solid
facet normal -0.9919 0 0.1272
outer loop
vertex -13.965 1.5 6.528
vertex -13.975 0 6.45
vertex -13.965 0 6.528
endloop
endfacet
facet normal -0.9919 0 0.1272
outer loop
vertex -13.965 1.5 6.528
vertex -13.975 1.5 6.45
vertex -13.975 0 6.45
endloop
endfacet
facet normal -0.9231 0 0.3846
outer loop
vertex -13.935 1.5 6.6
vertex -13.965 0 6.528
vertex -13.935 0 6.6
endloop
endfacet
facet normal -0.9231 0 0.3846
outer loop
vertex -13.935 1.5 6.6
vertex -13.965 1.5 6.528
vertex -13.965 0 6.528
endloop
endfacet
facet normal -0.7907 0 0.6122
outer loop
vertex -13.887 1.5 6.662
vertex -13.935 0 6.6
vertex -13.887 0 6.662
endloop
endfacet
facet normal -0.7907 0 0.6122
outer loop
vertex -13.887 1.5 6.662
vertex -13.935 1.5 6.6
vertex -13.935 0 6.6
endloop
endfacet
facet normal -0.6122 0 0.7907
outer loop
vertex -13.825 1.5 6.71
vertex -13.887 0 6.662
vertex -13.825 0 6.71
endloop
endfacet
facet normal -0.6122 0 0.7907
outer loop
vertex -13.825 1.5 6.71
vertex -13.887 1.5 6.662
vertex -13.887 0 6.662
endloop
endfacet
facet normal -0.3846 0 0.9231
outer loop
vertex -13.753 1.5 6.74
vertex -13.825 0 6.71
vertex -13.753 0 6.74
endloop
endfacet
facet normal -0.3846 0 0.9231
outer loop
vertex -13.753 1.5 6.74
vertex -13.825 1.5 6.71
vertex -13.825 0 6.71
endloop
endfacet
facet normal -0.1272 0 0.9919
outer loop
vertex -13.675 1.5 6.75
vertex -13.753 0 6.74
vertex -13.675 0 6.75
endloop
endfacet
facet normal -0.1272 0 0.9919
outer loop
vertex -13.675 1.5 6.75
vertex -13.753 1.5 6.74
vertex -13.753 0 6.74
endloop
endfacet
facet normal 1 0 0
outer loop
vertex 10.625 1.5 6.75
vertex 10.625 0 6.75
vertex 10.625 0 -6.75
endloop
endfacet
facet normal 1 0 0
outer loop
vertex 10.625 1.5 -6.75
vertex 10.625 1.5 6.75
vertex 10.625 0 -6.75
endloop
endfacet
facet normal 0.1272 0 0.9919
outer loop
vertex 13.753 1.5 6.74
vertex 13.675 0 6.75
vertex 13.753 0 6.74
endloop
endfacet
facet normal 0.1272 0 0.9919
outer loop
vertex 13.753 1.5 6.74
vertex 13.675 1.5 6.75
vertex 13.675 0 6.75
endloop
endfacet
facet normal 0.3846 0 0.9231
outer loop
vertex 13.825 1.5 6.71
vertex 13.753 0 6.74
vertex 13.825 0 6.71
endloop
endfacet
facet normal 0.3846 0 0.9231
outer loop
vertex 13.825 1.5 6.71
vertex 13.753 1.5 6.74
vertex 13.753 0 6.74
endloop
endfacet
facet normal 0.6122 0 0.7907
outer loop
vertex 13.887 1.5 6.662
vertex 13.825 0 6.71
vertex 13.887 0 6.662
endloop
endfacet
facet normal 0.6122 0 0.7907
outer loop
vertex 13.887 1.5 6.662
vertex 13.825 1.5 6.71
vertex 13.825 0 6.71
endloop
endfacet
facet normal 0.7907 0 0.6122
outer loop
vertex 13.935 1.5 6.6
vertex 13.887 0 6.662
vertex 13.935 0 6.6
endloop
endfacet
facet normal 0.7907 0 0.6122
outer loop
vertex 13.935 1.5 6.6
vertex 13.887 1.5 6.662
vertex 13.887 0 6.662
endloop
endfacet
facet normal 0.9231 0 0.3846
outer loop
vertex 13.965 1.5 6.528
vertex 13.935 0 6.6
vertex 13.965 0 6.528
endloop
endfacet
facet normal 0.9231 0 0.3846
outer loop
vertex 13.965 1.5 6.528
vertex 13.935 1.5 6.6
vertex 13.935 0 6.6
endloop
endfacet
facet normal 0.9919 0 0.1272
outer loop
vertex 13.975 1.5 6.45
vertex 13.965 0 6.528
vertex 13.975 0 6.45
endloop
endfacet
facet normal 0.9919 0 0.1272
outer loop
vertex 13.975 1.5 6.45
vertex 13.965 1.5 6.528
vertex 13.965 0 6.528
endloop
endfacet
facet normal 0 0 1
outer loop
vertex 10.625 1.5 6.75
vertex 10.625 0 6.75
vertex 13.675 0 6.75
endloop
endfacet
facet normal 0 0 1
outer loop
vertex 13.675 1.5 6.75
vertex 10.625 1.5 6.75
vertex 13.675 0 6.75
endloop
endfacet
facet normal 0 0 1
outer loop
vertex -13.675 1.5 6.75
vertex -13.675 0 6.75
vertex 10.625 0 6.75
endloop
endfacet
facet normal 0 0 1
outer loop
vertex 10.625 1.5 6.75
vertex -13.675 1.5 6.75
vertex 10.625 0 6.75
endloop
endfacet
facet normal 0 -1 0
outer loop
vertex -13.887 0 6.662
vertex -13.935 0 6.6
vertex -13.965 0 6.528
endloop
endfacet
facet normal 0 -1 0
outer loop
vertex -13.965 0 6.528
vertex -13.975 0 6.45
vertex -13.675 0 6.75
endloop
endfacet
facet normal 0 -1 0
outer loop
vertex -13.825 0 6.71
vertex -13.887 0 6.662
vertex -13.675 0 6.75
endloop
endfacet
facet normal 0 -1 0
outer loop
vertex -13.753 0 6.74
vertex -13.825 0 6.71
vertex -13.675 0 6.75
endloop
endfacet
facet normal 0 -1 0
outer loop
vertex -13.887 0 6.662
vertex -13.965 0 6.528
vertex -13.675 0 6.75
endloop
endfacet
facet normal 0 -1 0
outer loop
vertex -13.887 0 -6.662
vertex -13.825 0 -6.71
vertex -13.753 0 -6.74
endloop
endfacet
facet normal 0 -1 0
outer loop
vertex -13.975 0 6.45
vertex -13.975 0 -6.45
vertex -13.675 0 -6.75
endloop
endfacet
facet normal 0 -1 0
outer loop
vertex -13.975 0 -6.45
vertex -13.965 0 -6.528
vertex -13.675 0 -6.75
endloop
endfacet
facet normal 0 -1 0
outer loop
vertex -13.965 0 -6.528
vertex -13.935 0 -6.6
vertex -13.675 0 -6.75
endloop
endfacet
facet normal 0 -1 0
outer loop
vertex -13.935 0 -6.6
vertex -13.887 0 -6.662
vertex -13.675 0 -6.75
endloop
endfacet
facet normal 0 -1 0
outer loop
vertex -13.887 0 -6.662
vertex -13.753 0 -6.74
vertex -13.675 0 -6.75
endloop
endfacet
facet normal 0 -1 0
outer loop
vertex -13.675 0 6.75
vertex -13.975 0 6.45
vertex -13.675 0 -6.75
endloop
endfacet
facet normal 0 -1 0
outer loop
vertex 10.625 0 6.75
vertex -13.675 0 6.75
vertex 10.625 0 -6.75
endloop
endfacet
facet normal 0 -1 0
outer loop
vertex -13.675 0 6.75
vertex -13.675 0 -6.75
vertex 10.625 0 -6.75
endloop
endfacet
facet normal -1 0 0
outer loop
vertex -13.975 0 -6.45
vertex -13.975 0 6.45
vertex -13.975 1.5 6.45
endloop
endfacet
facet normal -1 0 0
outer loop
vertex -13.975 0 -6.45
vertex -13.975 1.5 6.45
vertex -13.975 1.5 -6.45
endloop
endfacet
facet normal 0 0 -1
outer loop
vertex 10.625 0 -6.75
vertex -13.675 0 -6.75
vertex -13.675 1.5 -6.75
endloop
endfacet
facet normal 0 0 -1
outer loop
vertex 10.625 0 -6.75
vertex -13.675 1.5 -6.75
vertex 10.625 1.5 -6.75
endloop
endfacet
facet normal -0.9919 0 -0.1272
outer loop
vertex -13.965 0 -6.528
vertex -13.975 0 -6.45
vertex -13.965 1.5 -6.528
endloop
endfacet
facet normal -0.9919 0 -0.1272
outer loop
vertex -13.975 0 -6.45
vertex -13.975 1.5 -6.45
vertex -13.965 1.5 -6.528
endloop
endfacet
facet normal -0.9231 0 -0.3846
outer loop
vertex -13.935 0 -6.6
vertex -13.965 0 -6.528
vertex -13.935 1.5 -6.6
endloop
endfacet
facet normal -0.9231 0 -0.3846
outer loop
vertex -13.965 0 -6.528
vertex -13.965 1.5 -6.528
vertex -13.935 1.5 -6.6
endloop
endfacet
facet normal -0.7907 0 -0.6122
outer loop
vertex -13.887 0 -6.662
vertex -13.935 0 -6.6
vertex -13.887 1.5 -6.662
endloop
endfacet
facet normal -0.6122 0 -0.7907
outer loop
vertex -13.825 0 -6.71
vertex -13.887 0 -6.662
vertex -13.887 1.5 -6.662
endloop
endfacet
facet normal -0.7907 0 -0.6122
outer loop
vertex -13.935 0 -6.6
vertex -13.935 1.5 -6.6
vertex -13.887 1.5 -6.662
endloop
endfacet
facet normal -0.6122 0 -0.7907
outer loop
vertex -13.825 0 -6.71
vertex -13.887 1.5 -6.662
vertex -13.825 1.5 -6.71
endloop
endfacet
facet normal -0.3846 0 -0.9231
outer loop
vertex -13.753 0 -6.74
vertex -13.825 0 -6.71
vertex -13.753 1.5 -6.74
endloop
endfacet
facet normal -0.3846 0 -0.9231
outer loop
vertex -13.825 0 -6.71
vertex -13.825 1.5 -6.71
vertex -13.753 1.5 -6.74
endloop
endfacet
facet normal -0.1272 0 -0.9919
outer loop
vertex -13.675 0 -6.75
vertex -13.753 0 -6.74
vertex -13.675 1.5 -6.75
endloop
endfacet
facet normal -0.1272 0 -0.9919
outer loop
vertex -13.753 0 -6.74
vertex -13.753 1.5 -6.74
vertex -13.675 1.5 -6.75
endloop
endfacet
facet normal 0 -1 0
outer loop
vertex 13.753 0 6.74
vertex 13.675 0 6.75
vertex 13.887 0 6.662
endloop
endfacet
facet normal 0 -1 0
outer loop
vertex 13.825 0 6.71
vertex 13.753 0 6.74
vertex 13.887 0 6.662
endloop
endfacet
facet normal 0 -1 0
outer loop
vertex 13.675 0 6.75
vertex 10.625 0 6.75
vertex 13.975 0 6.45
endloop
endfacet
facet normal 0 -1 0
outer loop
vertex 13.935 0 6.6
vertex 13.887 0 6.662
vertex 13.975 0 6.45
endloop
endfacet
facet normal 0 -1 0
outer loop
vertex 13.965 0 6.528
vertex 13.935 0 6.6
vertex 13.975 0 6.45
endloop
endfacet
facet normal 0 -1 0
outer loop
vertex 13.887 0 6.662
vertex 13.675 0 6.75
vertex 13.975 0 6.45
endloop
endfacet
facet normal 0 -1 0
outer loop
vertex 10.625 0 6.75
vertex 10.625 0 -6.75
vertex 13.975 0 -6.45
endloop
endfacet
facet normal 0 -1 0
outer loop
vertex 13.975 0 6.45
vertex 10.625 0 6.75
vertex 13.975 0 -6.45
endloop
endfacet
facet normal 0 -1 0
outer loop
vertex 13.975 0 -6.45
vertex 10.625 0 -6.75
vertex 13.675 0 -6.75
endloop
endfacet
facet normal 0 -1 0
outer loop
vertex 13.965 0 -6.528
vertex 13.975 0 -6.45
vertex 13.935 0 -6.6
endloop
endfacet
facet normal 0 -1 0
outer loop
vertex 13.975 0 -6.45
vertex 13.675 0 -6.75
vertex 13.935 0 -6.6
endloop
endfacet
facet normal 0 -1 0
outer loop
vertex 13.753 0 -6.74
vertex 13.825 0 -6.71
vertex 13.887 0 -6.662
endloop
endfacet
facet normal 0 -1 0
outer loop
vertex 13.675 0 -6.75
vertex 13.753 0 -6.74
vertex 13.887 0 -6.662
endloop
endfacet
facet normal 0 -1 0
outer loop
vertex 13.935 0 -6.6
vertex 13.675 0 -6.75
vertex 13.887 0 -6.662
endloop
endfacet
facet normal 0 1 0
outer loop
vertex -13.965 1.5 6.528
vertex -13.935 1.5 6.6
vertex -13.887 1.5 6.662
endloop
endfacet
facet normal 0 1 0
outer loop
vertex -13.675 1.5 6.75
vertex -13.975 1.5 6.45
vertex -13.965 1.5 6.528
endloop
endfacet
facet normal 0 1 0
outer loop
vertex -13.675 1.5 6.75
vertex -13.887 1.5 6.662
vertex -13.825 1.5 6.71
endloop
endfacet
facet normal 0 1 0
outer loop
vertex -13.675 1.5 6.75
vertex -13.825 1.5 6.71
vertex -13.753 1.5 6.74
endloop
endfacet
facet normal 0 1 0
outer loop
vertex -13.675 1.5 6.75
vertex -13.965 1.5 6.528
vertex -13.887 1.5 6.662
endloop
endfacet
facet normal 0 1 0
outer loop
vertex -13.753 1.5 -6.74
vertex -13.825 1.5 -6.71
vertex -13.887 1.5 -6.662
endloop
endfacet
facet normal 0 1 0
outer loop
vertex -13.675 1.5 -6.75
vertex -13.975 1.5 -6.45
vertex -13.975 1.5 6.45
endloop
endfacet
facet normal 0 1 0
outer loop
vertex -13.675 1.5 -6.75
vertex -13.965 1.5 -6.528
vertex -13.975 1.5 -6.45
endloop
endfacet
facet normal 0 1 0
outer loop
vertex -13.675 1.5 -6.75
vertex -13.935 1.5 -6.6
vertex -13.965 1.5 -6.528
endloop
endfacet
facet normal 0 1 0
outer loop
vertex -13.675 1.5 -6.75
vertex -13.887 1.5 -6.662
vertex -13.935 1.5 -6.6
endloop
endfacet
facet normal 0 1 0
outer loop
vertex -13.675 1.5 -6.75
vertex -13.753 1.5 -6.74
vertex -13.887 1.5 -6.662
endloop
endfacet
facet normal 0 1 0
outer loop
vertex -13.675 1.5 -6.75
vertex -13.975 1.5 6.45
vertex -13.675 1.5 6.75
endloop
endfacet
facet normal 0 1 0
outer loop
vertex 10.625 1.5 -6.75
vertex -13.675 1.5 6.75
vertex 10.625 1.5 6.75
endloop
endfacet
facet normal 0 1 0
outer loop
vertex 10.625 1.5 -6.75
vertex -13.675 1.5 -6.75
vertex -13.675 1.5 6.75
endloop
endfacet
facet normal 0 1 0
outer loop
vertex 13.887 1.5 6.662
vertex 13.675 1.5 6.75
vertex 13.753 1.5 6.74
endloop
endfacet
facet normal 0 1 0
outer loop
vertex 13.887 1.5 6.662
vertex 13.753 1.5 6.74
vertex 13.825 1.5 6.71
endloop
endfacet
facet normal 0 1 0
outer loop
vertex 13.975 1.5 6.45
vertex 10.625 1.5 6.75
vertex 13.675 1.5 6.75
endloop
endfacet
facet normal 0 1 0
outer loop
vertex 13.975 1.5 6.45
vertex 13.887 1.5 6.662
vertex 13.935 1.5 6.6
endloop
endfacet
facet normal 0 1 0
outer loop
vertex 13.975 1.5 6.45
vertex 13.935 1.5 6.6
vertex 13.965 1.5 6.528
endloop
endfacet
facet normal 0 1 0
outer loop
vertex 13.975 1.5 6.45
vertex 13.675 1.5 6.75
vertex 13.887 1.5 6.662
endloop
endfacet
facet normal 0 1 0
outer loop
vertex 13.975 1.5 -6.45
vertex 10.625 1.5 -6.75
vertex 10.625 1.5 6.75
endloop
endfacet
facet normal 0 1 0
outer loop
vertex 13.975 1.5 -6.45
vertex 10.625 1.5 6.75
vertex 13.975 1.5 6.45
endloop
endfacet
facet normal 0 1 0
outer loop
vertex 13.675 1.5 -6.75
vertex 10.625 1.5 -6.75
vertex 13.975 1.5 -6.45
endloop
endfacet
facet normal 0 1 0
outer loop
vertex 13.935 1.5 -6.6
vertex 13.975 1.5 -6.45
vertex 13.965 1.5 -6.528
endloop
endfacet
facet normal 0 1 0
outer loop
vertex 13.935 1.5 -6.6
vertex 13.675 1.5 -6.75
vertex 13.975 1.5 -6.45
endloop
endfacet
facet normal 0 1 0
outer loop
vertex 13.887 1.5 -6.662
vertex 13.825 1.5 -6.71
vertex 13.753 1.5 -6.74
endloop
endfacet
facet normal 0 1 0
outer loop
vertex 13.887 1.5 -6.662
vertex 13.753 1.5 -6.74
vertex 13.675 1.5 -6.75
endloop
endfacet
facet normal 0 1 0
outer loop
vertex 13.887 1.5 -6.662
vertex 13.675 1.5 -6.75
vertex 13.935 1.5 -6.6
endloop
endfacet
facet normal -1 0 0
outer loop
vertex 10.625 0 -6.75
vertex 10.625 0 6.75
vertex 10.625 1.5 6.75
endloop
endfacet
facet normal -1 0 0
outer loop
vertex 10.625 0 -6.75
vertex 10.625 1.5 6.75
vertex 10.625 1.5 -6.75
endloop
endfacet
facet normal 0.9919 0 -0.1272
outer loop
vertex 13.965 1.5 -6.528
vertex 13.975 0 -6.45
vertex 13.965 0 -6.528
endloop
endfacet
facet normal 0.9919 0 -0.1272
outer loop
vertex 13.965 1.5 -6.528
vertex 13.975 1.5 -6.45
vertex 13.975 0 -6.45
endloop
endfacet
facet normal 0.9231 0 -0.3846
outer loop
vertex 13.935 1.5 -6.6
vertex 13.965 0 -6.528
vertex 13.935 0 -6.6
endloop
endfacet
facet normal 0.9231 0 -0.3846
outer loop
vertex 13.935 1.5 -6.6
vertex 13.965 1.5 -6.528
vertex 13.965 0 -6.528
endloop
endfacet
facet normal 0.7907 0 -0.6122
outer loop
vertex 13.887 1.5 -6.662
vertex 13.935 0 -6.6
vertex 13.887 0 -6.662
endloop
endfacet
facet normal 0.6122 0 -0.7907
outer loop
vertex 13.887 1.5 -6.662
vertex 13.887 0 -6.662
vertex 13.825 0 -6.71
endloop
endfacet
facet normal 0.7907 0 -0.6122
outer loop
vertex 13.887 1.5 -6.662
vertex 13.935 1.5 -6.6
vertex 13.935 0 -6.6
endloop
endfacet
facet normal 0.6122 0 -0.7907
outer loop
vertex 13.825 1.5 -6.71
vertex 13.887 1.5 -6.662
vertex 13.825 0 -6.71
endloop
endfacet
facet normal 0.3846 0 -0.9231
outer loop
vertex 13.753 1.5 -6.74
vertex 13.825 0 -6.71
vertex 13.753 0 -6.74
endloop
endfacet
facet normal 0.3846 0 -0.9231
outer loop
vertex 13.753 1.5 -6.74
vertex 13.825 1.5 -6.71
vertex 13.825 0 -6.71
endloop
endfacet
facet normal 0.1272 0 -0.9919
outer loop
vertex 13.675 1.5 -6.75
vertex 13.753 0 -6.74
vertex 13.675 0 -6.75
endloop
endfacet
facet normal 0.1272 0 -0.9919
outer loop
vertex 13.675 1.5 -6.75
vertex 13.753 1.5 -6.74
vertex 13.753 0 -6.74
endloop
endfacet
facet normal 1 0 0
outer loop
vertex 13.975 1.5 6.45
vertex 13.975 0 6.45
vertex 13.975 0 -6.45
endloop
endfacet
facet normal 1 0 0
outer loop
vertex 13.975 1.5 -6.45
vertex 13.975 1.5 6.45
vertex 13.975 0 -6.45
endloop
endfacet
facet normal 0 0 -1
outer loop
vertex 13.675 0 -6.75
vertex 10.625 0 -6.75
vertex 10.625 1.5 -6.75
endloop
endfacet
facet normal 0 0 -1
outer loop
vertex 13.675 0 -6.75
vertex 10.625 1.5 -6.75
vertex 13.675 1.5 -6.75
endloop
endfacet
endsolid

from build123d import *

# Parameters (mm, degrees)
SKETCH_1_W      = 24.6
SKETCH_1_H      = 13.5
EXTRUDE_1_DEPTH = 1.5
SKETCH_1_3_W    = 3.35
SKETCH_1_3_H    = 13.5
EXTRUDE_2_DEPTH = 1.5
FILLET_1_R      = 0.3
FILLET_2_R      = 0.3


with BuildPart() as part:
    # 草图1 → 凸台-拉伸1 (new body)
    with BuildSketch(Plane(origin=(0, 0, 0), x_dir=(1, 0, 0), z_dir=(0, 1, 0))):
        with Locations((-1.675, 0)):
            Rectangle(SKETCH_1_W, SKETCH_1_H)
    extrude(amount=EXTRUDE_1_DEPTH)

    # 圆角2
    fillet_2_edges = [part.edges().sort_by_distance(p)[0] for p in [
        (-13.975, 0.75, 6.75),
        (-13.975, 0.75, -6.75),
    ]]
    fillet(fillet_2_edges, radius=FILLET_2_R)


with BuildPart() as body_2:
    # 草图1<3> → 凸台-拉伸2 (new body)
    with BuildSketch(Plane(origin=(0, 0, 0), x_dir=(1, 0, 0), z_dir=(0, 1, 0))):
        with Locations((12.3, 0)):
            Rectangle(SKETCH_1_3_W, SKETCH_1_3_H)
    extrude(amount=EXTRUDE_2_DEPTH)

    # 圆角1
    fillet_1_edges = [body_2.edges().sort_by_distance(p)[0] for p in [
        (13.975, 0.75, -6.75),
        (13.975, 0.75, 6.75),
    ]]
    fillet(fillet_1_edges, radius=FILLET_1_R)


solid = Compound([part.part, body_2.part])
